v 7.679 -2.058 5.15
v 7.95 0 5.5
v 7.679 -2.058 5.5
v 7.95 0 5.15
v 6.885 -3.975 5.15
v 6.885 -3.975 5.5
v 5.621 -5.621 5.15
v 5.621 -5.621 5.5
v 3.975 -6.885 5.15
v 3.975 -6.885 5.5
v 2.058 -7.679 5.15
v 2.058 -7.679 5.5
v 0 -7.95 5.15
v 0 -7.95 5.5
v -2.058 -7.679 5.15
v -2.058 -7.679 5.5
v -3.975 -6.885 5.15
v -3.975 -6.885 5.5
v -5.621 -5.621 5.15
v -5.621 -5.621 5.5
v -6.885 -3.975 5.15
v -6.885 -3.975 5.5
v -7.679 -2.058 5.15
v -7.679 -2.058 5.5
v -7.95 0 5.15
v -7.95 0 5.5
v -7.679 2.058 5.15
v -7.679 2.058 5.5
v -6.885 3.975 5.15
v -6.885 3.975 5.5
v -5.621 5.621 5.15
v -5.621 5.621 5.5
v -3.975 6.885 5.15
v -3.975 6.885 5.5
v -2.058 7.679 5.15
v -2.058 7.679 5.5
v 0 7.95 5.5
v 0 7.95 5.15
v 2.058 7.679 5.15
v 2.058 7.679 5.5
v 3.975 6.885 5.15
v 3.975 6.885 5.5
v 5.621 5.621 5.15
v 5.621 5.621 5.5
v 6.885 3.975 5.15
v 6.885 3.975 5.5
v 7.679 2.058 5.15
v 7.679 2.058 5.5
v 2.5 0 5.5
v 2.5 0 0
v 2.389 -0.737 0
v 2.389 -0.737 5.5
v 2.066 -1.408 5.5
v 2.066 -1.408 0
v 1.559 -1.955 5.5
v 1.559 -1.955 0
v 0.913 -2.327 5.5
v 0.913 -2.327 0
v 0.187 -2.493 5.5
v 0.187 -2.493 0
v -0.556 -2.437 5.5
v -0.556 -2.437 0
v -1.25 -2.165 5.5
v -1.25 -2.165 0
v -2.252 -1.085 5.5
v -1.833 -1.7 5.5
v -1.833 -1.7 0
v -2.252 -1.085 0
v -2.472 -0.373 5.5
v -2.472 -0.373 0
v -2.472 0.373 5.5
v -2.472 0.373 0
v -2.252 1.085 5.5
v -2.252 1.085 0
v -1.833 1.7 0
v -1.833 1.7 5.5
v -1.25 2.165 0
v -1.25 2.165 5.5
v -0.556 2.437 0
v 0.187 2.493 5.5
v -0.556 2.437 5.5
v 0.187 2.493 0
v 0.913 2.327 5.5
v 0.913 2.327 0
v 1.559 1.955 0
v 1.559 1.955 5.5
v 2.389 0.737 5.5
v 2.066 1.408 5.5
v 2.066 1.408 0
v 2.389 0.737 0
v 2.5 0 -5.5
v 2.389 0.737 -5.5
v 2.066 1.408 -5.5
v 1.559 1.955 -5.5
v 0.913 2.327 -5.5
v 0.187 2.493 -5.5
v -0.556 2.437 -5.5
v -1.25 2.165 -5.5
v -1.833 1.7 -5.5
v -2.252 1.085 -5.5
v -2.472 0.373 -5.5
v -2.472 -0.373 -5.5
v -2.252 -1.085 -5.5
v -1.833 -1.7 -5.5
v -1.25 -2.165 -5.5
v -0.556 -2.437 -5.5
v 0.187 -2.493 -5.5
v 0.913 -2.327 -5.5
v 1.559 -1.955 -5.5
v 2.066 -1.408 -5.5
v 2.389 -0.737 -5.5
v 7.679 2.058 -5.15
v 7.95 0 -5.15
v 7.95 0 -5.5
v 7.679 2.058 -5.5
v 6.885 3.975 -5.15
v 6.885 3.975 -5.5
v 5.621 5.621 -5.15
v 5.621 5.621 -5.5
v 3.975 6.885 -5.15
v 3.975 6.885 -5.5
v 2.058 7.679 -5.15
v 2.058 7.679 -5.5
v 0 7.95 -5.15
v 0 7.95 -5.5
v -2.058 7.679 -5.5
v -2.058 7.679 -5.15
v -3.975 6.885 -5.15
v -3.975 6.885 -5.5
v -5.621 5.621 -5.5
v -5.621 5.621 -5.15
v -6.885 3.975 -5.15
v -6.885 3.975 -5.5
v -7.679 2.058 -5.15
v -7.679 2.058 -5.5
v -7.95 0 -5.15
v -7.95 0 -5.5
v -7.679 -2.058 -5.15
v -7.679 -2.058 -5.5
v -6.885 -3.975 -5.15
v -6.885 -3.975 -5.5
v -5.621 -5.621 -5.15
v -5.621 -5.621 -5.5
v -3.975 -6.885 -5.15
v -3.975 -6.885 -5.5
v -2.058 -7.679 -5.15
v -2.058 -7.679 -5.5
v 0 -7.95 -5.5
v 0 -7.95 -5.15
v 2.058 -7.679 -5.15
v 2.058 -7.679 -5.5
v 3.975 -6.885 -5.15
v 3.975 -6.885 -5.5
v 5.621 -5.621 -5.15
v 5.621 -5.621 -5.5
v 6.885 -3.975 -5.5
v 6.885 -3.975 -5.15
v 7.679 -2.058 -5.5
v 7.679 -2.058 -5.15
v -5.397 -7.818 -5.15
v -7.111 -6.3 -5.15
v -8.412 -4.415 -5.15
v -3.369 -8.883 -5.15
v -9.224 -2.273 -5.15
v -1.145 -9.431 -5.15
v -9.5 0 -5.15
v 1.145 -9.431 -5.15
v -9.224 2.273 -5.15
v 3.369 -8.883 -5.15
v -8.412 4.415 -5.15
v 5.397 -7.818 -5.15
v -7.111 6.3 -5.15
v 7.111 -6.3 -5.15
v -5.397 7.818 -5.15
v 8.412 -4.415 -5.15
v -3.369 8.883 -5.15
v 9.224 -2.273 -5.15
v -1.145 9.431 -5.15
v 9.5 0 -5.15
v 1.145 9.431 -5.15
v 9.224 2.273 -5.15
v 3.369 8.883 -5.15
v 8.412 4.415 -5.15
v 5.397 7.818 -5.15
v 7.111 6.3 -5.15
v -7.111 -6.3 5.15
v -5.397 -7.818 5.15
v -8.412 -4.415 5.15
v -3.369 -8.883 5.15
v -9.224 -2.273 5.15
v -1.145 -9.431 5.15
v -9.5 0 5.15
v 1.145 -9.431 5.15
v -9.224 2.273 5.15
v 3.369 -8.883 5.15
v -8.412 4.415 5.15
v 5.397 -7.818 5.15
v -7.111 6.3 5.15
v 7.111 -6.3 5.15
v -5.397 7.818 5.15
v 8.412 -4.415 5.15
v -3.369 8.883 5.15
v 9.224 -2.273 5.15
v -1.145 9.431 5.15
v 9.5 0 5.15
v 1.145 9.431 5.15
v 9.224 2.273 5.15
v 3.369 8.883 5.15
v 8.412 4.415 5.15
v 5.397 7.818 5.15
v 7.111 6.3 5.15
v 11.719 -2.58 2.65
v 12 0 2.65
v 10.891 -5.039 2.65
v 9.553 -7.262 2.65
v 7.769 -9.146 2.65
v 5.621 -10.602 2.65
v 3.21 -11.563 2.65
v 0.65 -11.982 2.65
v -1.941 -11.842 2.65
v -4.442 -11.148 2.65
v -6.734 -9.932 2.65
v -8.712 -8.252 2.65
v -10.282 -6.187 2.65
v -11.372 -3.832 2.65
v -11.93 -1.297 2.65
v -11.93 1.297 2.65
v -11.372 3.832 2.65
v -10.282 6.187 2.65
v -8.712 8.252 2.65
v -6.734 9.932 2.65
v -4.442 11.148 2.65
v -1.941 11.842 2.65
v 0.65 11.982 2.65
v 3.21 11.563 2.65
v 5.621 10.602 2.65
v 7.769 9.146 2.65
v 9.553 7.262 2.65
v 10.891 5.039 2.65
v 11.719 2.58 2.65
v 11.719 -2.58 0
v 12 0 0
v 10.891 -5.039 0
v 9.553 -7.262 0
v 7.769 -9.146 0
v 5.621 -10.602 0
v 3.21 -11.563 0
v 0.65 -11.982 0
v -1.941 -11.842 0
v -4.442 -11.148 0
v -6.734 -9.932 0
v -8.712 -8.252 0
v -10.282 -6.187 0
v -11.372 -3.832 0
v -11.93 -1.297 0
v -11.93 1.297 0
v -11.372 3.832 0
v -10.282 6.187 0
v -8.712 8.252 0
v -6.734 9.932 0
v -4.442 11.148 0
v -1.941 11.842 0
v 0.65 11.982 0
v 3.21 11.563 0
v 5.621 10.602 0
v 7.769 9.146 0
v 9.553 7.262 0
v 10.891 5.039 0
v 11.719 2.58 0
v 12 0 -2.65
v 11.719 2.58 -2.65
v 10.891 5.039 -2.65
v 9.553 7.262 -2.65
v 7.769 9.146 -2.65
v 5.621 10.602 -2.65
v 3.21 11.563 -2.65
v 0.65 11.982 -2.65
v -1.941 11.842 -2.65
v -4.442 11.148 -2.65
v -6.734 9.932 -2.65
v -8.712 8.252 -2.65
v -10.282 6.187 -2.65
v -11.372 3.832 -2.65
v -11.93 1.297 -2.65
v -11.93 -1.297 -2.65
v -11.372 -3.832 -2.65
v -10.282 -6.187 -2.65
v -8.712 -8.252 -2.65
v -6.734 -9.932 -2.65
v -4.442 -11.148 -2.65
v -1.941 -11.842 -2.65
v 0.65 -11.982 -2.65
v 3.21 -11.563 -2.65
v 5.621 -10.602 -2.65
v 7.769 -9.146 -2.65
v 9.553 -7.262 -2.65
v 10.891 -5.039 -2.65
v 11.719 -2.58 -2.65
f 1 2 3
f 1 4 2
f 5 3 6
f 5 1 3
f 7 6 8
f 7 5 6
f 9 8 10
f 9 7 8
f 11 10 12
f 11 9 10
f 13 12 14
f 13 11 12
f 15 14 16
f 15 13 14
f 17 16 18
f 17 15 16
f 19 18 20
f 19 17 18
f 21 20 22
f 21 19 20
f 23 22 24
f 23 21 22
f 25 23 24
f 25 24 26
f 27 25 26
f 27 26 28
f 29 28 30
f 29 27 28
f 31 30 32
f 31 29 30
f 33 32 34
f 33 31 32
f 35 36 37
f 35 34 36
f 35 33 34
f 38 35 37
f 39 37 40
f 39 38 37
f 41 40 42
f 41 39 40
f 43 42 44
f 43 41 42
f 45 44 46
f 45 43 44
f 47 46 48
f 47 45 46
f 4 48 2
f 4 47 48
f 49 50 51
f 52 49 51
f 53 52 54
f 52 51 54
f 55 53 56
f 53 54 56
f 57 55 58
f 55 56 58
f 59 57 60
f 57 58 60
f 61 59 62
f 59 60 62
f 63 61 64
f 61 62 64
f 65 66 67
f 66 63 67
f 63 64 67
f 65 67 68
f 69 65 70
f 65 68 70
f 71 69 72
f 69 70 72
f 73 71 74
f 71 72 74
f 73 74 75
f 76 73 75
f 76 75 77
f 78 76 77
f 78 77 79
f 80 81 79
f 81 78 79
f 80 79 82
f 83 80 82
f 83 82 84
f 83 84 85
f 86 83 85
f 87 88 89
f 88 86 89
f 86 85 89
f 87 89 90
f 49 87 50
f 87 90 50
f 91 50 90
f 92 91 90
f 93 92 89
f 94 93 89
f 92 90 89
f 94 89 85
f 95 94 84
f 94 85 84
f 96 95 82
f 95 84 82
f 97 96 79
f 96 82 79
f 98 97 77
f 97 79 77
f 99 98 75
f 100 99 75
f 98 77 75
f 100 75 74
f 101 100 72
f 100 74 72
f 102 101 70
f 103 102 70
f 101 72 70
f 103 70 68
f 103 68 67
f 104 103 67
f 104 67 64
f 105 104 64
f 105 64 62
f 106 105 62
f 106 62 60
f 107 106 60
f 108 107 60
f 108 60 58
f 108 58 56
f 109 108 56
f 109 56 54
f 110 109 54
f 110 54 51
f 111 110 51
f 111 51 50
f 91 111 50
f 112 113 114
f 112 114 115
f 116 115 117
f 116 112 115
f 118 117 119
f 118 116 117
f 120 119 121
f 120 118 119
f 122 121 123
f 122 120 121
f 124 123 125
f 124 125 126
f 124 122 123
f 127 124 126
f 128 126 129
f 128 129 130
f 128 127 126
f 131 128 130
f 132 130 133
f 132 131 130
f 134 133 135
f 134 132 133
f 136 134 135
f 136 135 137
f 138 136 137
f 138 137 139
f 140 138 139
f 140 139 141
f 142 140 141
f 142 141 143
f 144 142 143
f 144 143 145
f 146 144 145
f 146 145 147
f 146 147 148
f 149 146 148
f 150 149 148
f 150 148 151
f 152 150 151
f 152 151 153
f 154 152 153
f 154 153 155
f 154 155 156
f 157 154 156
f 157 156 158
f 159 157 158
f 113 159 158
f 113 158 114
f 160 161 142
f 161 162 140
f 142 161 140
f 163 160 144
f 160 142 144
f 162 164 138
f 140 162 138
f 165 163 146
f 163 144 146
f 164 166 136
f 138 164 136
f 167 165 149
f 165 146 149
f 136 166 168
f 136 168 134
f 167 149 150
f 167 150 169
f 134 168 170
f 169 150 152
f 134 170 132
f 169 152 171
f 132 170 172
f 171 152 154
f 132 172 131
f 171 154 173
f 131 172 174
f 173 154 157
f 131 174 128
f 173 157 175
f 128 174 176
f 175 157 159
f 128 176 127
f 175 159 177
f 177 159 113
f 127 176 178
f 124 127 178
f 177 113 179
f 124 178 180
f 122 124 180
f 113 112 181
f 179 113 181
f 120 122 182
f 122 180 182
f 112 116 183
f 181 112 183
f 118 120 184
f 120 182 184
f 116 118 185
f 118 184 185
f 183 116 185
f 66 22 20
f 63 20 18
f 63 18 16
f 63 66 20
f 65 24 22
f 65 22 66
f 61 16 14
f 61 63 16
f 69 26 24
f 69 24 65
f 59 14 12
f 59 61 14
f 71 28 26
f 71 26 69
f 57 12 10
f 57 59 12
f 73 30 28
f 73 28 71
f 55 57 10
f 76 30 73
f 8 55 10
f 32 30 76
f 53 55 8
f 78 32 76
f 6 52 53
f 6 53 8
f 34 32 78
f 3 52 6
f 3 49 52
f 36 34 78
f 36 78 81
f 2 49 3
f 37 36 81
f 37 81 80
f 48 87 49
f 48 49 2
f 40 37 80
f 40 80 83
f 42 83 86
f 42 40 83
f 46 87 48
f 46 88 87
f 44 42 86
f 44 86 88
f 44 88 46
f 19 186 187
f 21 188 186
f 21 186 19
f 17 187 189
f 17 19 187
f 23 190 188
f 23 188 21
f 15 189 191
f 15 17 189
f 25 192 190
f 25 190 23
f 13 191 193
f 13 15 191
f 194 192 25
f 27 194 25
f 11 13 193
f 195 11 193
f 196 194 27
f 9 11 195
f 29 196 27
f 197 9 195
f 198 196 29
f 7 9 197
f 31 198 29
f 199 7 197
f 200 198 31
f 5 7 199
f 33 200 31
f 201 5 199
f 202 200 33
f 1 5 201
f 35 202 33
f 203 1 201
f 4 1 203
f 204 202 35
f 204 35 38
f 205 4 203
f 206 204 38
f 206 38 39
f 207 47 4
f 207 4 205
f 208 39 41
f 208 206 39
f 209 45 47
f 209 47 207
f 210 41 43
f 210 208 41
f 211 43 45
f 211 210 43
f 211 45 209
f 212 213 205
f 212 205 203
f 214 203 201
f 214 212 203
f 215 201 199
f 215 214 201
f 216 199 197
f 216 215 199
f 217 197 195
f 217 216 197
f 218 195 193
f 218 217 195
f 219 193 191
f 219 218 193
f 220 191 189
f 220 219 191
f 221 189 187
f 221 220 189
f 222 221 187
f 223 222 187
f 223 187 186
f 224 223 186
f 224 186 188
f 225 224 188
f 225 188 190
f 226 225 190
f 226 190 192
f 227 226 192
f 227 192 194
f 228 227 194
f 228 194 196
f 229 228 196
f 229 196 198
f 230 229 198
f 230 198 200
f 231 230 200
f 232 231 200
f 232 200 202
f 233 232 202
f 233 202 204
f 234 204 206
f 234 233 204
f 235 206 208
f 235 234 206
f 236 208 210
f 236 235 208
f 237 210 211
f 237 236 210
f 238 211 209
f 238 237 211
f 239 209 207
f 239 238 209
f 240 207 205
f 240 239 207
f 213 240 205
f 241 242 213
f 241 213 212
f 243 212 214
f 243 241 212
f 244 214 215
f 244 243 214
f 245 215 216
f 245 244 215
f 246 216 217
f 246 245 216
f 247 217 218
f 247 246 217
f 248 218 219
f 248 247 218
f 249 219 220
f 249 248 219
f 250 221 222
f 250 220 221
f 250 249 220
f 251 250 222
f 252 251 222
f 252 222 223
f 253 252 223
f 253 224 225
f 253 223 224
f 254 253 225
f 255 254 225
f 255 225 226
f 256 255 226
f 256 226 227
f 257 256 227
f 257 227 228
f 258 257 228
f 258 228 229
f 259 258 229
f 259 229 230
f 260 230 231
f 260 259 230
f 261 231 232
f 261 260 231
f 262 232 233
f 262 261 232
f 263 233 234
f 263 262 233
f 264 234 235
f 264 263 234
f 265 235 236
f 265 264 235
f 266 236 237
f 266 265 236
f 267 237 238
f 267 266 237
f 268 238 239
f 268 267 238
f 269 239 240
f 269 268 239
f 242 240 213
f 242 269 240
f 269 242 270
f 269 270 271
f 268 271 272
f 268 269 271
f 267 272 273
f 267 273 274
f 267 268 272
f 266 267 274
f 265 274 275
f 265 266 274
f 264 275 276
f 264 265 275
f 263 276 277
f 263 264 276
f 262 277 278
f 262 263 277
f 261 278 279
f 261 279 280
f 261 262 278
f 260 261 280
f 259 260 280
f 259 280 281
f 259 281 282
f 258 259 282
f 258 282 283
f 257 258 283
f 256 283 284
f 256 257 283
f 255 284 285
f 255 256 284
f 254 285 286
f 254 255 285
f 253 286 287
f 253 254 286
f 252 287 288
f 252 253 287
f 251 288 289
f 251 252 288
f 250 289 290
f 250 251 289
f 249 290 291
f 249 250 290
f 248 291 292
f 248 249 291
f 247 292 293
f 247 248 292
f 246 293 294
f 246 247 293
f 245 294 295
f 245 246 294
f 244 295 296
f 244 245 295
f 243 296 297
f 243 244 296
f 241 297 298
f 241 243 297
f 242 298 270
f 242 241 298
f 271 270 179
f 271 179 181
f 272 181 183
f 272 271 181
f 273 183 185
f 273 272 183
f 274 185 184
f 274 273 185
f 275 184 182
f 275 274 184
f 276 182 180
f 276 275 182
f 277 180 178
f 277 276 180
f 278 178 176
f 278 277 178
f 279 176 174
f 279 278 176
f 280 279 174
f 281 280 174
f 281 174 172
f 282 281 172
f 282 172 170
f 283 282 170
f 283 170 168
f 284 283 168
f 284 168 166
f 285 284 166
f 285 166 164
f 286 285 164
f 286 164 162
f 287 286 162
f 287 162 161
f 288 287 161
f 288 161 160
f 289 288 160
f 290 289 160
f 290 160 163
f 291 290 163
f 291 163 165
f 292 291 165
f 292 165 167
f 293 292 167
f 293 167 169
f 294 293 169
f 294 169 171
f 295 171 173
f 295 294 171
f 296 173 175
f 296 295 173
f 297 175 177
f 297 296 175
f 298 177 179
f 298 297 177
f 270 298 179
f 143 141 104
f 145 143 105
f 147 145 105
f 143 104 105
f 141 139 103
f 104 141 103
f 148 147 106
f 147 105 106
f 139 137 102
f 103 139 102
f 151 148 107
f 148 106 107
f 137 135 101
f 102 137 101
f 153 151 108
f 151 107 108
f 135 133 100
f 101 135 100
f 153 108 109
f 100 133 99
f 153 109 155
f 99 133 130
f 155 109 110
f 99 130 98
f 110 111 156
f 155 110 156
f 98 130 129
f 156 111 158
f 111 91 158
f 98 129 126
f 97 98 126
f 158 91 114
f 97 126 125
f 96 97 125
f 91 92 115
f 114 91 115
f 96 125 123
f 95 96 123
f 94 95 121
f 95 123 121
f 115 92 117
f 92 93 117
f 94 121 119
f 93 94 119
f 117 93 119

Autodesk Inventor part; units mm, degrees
ref_plane "YZ Plane" through (0, 0, 0) normal (1, 0, 0) x (0, 1, 0)
ref_plane "XZ Plane" through (0, 0, 0) normal (0, 1, 0) x (-1, 0, 0)
ref_plane "XY Plane" through (0, 0, 0) normal (0, 0, 1) x (1, 0, 0)
sketch "Sketch1" plane through (0, 0, 0) normal (0, 0, 1) x (1, 0, 0)
  circle A0 centre (0, 0) radius 2.5
  circle A1 centre (0, 0) radius 12
  circle A2 centre (0, 0) radius 7.95
  dimension "d0" = 5
  dimension "d1" = 24
  dimension "d2" = 15.9
extrude "Extrusion1" add sketch "Sketch1" along normal mid plane 11 contours A2
extrude "Extrusion2" add sketch "Sketch1" along normal mid plane 10.3 contours A1
chamfer "Chamfer1" distance 2.5 angle 45 2 edges at (-12, 0, 5.15) (-12, 0, -5.15)
properties part number "Printer Wheel"
